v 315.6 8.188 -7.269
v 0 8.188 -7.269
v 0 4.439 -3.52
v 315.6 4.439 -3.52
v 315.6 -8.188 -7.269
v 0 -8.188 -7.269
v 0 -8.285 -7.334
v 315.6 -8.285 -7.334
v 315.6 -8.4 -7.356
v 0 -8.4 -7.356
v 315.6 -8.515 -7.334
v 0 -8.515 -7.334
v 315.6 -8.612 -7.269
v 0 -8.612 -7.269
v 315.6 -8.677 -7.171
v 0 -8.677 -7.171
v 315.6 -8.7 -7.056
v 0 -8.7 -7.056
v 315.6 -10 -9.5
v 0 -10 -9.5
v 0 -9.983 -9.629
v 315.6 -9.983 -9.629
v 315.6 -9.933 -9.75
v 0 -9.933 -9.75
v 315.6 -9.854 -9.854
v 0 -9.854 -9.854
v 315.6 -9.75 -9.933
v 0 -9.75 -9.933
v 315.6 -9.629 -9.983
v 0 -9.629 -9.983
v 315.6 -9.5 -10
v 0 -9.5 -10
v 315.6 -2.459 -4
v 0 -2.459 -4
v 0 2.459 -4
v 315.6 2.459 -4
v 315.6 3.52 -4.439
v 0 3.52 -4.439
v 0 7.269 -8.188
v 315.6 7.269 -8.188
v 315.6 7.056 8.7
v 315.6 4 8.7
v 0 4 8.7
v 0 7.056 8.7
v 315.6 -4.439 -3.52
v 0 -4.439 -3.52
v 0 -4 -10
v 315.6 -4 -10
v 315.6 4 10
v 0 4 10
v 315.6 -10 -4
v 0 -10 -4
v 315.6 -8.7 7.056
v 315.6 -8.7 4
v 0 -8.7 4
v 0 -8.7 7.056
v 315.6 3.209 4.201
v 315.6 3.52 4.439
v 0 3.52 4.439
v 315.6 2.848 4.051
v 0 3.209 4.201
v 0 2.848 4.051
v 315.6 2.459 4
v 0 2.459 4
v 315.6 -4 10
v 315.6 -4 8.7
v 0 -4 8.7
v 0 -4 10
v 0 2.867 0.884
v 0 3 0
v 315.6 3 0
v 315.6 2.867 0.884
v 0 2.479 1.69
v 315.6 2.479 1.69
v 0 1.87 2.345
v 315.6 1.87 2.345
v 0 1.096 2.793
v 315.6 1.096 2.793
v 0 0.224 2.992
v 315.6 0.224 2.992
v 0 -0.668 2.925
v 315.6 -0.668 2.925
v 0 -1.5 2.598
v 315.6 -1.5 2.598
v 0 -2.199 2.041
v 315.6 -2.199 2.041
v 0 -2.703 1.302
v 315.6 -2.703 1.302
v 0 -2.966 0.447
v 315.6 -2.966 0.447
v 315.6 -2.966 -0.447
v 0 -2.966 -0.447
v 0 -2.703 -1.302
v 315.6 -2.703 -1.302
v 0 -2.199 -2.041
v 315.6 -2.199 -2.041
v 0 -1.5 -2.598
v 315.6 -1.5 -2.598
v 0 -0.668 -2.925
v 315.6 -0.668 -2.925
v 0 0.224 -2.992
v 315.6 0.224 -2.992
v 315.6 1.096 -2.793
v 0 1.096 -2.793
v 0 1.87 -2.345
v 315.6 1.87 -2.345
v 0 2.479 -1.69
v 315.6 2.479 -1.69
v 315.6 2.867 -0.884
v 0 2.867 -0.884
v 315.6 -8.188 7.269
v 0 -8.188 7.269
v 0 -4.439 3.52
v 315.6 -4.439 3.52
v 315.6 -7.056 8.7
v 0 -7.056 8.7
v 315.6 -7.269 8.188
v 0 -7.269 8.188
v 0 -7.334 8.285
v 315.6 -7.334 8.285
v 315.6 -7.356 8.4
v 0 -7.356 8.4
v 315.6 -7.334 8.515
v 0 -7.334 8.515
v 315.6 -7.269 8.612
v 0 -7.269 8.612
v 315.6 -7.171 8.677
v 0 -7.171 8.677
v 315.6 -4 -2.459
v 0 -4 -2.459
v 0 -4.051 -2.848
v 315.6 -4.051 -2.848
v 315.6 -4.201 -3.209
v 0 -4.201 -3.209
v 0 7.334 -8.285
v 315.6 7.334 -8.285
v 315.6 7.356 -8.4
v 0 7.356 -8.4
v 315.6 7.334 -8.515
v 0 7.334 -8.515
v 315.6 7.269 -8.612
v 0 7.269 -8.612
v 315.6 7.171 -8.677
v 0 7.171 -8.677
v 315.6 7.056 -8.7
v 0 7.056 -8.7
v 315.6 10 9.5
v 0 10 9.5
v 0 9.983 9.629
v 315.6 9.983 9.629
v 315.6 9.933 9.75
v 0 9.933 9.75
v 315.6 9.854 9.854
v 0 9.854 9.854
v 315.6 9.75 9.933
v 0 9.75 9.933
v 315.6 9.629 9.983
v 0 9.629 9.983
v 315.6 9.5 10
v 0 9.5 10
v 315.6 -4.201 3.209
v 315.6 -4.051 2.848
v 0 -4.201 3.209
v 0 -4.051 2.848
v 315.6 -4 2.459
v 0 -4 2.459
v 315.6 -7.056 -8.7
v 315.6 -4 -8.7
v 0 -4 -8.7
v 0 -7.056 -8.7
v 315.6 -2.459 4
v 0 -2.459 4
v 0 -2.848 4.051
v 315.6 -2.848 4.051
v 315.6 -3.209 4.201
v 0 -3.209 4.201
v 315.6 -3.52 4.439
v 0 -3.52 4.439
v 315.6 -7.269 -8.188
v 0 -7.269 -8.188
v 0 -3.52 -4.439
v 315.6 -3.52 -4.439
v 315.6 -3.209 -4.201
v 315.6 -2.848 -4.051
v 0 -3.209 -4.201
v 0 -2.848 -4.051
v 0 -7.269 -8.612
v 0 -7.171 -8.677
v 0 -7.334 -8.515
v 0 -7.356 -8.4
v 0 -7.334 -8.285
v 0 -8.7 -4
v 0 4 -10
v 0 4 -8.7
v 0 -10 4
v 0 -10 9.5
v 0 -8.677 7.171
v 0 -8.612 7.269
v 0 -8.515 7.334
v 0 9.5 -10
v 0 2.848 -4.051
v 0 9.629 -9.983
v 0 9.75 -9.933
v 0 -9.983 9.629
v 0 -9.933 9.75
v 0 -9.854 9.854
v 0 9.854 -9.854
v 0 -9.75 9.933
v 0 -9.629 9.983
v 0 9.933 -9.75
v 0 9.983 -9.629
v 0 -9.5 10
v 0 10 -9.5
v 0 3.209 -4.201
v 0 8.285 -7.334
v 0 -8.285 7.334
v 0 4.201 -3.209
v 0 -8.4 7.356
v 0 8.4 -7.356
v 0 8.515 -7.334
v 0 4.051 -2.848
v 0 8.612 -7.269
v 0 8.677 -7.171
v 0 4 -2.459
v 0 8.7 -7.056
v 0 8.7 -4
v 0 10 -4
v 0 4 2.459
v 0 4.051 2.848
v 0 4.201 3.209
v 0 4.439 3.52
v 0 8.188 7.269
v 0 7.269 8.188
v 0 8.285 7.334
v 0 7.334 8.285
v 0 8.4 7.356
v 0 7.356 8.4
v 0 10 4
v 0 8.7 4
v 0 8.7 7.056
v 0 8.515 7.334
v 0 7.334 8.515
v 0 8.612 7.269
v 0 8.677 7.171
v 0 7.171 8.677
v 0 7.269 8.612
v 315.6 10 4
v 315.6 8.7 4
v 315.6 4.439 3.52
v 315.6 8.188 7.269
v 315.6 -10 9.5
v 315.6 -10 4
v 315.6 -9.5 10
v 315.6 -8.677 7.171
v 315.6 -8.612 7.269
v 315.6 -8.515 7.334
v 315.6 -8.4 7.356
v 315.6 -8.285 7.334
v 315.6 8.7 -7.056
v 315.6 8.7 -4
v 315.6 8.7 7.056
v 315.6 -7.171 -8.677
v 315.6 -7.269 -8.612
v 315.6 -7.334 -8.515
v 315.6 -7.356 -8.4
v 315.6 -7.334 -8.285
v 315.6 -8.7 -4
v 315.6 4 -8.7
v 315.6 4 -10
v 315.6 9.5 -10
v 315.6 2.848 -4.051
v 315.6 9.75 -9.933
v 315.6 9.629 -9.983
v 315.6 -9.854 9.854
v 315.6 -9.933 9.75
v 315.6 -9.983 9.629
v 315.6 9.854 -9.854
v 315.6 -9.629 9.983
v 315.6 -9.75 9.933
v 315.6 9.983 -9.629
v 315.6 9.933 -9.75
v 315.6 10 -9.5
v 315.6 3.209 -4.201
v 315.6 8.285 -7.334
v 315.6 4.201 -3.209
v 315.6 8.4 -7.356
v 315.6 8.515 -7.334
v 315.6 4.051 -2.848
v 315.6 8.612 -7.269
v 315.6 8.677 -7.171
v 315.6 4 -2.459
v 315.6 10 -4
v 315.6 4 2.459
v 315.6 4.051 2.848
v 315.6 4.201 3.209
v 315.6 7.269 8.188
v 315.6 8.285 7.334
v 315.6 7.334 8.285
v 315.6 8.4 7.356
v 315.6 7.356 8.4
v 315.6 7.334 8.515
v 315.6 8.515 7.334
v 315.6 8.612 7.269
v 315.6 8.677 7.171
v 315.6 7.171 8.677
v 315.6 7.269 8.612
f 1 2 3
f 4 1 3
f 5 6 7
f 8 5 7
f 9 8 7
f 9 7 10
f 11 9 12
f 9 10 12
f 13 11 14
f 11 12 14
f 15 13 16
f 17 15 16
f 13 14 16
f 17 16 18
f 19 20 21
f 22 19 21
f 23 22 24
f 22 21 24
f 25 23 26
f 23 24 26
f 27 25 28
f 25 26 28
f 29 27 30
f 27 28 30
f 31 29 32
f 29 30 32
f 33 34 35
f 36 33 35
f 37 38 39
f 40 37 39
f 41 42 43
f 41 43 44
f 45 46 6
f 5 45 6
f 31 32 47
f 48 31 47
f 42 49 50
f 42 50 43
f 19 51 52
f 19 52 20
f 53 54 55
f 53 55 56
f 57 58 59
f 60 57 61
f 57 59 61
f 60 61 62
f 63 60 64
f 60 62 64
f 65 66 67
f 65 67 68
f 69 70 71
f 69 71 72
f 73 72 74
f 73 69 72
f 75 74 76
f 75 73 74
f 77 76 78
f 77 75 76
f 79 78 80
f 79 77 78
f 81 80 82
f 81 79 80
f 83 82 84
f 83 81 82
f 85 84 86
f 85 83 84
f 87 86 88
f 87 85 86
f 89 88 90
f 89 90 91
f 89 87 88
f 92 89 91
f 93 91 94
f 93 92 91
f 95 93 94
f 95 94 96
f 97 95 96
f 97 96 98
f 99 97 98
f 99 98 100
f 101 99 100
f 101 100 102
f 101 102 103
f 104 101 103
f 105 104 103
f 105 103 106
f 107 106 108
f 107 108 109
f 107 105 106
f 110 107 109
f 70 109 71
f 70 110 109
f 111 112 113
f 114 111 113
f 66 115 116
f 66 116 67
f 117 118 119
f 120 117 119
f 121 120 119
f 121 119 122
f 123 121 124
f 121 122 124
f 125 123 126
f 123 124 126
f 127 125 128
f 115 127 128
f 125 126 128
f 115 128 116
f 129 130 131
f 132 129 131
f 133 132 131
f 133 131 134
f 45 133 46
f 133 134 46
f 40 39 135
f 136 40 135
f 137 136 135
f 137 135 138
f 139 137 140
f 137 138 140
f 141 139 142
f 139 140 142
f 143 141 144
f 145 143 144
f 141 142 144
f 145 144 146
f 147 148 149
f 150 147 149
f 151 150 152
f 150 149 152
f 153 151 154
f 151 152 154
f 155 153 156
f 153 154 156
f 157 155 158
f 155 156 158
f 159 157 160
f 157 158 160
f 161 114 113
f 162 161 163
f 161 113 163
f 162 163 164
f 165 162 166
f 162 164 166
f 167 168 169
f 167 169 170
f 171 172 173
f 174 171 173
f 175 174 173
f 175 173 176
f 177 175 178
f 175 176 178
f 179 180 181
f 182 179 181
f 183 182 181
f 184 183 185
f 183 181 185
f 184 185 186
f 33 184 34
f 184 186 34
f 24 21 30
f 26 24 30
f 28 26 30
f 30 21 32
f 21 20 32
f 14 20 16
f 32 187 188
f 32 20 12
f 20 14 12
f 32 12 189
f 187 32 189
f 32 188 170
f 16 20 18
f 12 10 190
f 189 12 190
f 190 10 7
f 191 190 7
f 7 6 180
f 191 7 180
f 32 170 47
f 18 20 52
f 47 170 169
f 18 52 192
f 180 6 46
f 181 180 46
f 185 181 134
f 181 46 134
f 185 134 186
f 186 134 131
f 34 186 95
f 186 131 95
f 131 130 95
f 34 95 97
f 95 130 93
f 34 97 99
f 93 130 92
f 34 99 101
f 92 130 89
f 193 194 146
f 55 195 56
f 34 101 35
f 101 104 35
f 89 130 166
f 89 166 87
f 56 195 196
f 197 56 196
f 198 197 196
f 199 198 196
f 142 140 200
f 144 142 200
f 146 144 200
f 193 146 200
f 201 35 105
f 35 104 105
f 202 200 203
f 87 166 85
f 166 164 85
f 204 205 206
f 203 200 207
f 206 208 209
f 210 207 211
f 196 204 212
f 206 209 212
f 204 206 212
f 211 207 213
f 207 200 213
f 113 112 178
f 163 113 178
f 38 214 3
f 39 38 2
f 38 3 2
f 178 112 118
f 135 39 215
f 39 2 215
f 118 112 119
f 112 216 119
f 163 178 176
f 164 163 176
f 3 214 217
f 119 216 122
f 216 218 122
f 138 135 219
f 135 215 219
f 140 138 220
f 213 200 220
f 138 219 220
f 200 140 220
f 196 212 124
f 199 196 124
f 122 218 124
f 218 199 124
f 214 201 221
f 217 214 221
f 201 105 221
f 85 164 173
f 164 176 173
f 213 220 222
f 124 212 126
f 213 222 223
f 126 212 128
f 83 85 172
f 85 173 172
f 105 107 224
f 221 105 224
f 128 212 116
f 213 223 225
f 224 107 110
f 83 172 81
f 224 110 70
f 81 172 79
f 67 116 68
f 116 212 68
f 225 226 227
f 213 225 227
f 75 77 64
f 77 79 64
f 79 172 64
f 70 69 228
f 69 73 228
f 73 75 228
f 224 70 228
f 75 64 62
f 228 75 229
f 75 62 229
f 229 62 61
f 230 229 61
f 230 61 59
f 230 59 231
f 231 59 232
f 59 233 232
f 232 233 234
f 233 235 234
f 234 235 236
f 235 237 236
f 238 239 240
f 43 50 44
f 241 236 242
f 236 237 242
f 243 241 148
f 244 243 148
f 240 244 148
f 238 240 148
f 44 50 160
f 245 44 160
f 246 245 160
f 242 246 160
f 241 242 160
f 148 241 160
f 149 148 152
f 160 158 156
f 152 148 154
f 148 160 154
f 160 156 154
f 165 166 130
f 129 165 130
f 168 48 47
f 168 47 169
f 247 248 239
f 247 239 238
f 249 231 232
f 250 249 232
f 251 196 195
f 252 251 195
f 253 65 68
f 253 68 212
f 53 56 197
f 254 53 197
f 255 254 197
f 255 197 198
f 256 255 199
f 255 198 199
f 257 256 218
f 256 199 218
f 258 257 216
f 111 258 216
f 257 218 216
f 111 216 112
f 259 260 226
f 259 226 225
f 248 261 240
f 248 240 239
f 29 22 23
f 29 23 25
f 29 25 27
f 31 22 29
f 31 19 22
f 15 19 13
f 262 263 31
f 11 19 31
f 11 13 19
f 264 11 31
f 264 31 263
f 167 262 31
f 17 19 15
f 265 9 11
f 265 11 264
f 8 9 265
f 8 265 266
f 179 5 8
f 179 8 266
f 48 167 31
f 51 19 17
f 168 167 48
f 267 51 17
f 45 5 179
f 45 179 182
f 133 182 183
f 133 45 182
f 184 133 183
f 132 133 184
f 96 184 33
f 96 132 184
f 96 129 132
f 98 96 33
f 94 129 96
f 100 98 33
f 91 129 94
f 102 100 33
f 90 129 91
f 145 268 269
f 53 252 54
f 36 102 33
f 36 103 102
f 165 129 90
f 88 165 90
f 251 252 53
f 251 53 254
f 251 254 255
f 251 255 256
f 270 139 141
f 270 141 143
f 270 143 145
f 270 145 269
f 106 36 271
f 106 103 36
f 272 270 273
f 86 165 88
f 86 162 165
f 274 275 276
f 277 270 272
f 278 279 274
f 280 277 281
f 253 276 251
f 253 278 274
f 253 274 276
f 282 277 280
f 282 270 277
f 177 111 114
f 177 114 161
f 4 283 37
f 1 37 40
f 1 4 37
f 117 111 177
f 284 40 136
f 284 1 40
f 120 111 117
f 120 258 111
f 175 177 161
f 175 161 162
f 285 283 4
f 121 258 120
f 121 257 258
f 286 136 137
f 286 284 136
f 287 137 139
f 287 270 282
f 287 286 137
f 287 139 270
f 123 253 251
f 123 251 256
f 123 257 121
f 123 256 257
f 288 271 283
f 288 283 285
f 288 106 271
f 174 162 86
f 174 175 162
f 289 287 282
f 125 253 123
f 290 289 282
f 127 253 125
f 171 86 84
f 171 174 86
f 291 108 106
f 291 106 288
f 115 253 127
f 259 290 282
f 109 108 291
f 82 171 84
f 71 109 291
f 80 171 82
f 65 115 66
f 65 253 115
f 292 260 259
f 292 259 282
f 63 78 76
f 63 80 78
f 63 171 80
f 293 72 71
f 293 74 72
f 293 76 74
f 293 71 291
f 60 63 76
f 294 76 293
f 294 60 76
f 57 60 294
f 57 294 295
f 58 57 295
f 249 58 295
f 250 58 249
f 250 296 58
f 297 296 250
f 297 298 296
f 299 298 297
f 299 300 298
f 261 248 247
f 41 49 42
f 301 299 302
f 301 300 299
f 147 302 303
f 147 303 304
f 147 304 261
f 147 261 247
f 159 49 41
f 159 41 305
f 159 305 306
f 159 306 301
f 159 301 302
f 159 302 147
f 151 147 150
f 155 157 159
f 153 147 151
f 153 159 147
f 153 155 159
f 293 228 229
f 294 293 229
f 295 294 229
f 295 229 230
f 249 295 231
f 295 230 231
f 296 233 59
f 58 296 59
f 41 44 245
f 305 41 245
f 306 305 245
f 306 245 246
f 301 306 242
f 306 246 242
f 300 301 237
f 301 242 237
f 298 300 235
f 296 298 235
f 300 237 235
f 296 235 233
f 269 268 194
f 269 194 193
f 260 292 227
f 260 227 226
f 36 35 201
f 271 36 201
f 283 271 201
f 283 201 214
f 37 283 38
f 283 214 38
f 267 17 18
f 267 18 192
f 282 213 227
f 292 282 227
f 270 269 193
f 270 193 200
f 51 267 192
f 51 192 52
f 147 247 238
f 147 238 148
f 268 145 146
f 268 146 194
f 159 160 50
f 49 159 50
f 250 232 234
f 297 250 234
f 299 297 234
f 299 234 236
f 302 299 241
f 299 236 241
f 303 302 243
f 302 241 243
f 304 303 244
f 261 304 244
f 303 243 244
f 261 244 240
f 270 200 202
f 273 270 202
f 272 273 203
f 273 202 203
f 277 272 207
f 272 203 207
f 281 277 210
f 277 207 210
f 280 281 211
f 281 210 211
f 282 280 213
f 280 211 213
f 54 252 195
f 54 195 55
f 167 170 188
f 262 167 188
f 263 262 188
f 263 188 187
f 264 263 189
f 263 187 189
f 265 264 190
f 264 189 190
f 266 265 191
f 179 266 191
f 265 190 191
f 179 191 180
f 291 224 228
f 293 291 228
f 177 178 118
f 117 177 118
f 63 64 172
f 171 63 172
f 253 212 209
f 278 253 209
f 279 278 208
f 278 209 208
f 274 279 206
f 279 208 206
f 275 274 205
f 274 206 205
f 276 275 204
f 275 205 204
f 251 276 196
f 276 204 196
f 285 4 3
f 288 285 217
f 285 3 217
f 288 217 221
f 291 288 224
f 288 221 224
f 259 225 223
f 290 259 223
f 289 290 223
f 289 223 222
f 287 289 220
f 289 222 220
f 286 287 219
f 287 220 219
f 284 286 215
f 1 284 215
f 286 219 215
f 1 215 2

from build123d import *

# Parameters (mm, degrees)
SKETCH1_R                                   = 3
QUADRADO_PF20_01_PERFIL_2020_B_SICO_1_DEPTH = 315.6


with BuildPart() as part:
    # Sketch1 → Quadrado PF20-01 - PERFIL 2020 BÁSICO(1) (new body)
    with BuildSketch(Plane.YZ):
        with BuildLine():
            Line((8.187867966, -7.26862915), (4.439339828, -3.520101013))
            ThreePointArc((4.439339828, -3.520101013), (4.114180701, -3.033465989), (4, -2.459440841))
            Line((4, -2.459440841), (4, 2.459440841))
            ThreePointArc((4, 2.459440841), (4.114180701, 3.033465989), (4.439339828, 3.520101013))
            Line((4.439339828, 3.520101013), (8.187867966, 7.26862915))
            ThreePointArc((8.187867966, 7.26862915), (8.51480503, 7.333660975), (8.7, 7.056497116))
            Line((8.7, 7.056497116), (8.7, 4))
            Line((8.7, 4), (10, 4))
            Line((10, 4), (10, 9.5))
            ThreePointArc((10, 9.5), (9.853553391, 9.853553391), (9.5, 10))
            Line((9.5, 10), (4, 10))
            Line((4, 10), (4, 8.7))
            Line((4, 8.7), (7.056497116, 8.7))
            ThreePointArc((7.056497116, 8.7), (7.333660975, 8.51480503), (7.26862915, 8.187867966))
            Line((7.26862915, 8.187867966), (3.520101013, 4.439339828))
            ThreePointArc((3.520101013, 4.439339828), (3.033465989, 4.114180701), (2.459440841, 4))
            Line((2.459440841, 4), (-2.459440841, 4))
            ThreePointArc((-2.459440841, 4), (-3.033465989, 4.114180701), (-3.520101013, 4.439339828))
            Line((-3.520101013, 4.439339828), (-7.26862915, 8.187867966))
            ThreePointArc((-7.26862915, 8.187867966), (-7.333660975, 8.51480503), (-7.056497116, 8.7))
            Line((-7.056497116, 8.7), (-4, 8.7))
            Line((-4, 8.7), (-4, 10))
            Line((-4, 10), (-9.5, 10))
            ThreePointArc((-9.5, 10), (-9.853553391, 9.853553391), (-10, 9.5))
            Line((-10, 9.5), (-10, 4))
            Line((-10, 4), (-8.7, 4))
            Line((-8.7, 4), (-8.7, 7.056497116))
            ThreePointArc((-8.7, 7.056497116), (-8.51480503, 7.333660975), (-8.187867966, 7.26862915))
            Line((-8.187867966, 7.26862915), (-4.439339828, 3.520101013))
            ThreePointArc((-4.439339828, 3.520101013), (-4.114180701, 3.033465989), (-4, 2.459440841))
            Line((-4, 2.459440841), (-4, -2.459440841))
            ThreePointArc((-4, -2.459440841), (-4.114180701, -3.033465989), (-4.439339828, -3.520101013))
            Line((-4.439339828, -3.520101013), (-8.187867966, -7.26862915))
            ThreePointArc((-8.187867966, -7.26862915), (-8.51480503, -7.333660975), (-8.7, -7.056497116))
            Line((-8.7, -7.056497116), (-8.7, -4))
            Line((-8.7, -4), (-10, -4))
            Line((-10, -4), (-10, -9.5))
            ThreePointArc((-10, -9.5), (-9.853553391, -9.853553391), (-9.5, -10))
            Line((-9.5, -10), (-4, -10))
            Line((-4, -10), (-4, -8.7))
            Line((-4, -8.7), (-7.056497116, -8.7))
            ThreePointArc((-7.056497116, -8.7), (-7.333660975, -8.51480503), (-7.26862915, -8.187867966))
            Line((-7.26862915, -8.187867966), (-3.520101013, -4.439339828))
            ThreePointArc((-3.520101013, -4.439339828), (-3.033465989, -4.114180701), (-2.459440841, -4))
            Line((-2.459440841, -4), (2.459440841, -4))
            ThreePointArc((2.459440841, -4), (3.033465989, -4.114180701), (3.520101013, -4.439339828))
            Line((3.520101013, -4.439339828), (7.26862915, -8.187867966))
            ThreePointArc((7.26862915, -8.187867966), (7.333660975, -8.51480503), (7.056497116, -8.7))
            Line((7.056497116, -8.7), (4, -8.7))
            Line((4, -8.7), (4, -10))
            Line((4, -10), (9.5, -10))
            ThreePointArc((9.5, -10), (9.853553391, -9.853553391), (10, -9.5))
            Line((10, -9.5), (10, -4))
            Line((10, -4), (8.7, -4))
            Line((8.7, -4), (8.7, -7.056497116))
            ThreePointArc((8.7, -7.056497116), (8.51480503, -7.333660975), (8.187867966, -7.26862915))
        make_face()
        Circle(SKETCH1_R, mode=Mode.SUBTRACT)
    extrude(amount=QUADRADO_PF20_01_PERFIL_2020_B_SICO_1_DEPTH)


solid = part.part
